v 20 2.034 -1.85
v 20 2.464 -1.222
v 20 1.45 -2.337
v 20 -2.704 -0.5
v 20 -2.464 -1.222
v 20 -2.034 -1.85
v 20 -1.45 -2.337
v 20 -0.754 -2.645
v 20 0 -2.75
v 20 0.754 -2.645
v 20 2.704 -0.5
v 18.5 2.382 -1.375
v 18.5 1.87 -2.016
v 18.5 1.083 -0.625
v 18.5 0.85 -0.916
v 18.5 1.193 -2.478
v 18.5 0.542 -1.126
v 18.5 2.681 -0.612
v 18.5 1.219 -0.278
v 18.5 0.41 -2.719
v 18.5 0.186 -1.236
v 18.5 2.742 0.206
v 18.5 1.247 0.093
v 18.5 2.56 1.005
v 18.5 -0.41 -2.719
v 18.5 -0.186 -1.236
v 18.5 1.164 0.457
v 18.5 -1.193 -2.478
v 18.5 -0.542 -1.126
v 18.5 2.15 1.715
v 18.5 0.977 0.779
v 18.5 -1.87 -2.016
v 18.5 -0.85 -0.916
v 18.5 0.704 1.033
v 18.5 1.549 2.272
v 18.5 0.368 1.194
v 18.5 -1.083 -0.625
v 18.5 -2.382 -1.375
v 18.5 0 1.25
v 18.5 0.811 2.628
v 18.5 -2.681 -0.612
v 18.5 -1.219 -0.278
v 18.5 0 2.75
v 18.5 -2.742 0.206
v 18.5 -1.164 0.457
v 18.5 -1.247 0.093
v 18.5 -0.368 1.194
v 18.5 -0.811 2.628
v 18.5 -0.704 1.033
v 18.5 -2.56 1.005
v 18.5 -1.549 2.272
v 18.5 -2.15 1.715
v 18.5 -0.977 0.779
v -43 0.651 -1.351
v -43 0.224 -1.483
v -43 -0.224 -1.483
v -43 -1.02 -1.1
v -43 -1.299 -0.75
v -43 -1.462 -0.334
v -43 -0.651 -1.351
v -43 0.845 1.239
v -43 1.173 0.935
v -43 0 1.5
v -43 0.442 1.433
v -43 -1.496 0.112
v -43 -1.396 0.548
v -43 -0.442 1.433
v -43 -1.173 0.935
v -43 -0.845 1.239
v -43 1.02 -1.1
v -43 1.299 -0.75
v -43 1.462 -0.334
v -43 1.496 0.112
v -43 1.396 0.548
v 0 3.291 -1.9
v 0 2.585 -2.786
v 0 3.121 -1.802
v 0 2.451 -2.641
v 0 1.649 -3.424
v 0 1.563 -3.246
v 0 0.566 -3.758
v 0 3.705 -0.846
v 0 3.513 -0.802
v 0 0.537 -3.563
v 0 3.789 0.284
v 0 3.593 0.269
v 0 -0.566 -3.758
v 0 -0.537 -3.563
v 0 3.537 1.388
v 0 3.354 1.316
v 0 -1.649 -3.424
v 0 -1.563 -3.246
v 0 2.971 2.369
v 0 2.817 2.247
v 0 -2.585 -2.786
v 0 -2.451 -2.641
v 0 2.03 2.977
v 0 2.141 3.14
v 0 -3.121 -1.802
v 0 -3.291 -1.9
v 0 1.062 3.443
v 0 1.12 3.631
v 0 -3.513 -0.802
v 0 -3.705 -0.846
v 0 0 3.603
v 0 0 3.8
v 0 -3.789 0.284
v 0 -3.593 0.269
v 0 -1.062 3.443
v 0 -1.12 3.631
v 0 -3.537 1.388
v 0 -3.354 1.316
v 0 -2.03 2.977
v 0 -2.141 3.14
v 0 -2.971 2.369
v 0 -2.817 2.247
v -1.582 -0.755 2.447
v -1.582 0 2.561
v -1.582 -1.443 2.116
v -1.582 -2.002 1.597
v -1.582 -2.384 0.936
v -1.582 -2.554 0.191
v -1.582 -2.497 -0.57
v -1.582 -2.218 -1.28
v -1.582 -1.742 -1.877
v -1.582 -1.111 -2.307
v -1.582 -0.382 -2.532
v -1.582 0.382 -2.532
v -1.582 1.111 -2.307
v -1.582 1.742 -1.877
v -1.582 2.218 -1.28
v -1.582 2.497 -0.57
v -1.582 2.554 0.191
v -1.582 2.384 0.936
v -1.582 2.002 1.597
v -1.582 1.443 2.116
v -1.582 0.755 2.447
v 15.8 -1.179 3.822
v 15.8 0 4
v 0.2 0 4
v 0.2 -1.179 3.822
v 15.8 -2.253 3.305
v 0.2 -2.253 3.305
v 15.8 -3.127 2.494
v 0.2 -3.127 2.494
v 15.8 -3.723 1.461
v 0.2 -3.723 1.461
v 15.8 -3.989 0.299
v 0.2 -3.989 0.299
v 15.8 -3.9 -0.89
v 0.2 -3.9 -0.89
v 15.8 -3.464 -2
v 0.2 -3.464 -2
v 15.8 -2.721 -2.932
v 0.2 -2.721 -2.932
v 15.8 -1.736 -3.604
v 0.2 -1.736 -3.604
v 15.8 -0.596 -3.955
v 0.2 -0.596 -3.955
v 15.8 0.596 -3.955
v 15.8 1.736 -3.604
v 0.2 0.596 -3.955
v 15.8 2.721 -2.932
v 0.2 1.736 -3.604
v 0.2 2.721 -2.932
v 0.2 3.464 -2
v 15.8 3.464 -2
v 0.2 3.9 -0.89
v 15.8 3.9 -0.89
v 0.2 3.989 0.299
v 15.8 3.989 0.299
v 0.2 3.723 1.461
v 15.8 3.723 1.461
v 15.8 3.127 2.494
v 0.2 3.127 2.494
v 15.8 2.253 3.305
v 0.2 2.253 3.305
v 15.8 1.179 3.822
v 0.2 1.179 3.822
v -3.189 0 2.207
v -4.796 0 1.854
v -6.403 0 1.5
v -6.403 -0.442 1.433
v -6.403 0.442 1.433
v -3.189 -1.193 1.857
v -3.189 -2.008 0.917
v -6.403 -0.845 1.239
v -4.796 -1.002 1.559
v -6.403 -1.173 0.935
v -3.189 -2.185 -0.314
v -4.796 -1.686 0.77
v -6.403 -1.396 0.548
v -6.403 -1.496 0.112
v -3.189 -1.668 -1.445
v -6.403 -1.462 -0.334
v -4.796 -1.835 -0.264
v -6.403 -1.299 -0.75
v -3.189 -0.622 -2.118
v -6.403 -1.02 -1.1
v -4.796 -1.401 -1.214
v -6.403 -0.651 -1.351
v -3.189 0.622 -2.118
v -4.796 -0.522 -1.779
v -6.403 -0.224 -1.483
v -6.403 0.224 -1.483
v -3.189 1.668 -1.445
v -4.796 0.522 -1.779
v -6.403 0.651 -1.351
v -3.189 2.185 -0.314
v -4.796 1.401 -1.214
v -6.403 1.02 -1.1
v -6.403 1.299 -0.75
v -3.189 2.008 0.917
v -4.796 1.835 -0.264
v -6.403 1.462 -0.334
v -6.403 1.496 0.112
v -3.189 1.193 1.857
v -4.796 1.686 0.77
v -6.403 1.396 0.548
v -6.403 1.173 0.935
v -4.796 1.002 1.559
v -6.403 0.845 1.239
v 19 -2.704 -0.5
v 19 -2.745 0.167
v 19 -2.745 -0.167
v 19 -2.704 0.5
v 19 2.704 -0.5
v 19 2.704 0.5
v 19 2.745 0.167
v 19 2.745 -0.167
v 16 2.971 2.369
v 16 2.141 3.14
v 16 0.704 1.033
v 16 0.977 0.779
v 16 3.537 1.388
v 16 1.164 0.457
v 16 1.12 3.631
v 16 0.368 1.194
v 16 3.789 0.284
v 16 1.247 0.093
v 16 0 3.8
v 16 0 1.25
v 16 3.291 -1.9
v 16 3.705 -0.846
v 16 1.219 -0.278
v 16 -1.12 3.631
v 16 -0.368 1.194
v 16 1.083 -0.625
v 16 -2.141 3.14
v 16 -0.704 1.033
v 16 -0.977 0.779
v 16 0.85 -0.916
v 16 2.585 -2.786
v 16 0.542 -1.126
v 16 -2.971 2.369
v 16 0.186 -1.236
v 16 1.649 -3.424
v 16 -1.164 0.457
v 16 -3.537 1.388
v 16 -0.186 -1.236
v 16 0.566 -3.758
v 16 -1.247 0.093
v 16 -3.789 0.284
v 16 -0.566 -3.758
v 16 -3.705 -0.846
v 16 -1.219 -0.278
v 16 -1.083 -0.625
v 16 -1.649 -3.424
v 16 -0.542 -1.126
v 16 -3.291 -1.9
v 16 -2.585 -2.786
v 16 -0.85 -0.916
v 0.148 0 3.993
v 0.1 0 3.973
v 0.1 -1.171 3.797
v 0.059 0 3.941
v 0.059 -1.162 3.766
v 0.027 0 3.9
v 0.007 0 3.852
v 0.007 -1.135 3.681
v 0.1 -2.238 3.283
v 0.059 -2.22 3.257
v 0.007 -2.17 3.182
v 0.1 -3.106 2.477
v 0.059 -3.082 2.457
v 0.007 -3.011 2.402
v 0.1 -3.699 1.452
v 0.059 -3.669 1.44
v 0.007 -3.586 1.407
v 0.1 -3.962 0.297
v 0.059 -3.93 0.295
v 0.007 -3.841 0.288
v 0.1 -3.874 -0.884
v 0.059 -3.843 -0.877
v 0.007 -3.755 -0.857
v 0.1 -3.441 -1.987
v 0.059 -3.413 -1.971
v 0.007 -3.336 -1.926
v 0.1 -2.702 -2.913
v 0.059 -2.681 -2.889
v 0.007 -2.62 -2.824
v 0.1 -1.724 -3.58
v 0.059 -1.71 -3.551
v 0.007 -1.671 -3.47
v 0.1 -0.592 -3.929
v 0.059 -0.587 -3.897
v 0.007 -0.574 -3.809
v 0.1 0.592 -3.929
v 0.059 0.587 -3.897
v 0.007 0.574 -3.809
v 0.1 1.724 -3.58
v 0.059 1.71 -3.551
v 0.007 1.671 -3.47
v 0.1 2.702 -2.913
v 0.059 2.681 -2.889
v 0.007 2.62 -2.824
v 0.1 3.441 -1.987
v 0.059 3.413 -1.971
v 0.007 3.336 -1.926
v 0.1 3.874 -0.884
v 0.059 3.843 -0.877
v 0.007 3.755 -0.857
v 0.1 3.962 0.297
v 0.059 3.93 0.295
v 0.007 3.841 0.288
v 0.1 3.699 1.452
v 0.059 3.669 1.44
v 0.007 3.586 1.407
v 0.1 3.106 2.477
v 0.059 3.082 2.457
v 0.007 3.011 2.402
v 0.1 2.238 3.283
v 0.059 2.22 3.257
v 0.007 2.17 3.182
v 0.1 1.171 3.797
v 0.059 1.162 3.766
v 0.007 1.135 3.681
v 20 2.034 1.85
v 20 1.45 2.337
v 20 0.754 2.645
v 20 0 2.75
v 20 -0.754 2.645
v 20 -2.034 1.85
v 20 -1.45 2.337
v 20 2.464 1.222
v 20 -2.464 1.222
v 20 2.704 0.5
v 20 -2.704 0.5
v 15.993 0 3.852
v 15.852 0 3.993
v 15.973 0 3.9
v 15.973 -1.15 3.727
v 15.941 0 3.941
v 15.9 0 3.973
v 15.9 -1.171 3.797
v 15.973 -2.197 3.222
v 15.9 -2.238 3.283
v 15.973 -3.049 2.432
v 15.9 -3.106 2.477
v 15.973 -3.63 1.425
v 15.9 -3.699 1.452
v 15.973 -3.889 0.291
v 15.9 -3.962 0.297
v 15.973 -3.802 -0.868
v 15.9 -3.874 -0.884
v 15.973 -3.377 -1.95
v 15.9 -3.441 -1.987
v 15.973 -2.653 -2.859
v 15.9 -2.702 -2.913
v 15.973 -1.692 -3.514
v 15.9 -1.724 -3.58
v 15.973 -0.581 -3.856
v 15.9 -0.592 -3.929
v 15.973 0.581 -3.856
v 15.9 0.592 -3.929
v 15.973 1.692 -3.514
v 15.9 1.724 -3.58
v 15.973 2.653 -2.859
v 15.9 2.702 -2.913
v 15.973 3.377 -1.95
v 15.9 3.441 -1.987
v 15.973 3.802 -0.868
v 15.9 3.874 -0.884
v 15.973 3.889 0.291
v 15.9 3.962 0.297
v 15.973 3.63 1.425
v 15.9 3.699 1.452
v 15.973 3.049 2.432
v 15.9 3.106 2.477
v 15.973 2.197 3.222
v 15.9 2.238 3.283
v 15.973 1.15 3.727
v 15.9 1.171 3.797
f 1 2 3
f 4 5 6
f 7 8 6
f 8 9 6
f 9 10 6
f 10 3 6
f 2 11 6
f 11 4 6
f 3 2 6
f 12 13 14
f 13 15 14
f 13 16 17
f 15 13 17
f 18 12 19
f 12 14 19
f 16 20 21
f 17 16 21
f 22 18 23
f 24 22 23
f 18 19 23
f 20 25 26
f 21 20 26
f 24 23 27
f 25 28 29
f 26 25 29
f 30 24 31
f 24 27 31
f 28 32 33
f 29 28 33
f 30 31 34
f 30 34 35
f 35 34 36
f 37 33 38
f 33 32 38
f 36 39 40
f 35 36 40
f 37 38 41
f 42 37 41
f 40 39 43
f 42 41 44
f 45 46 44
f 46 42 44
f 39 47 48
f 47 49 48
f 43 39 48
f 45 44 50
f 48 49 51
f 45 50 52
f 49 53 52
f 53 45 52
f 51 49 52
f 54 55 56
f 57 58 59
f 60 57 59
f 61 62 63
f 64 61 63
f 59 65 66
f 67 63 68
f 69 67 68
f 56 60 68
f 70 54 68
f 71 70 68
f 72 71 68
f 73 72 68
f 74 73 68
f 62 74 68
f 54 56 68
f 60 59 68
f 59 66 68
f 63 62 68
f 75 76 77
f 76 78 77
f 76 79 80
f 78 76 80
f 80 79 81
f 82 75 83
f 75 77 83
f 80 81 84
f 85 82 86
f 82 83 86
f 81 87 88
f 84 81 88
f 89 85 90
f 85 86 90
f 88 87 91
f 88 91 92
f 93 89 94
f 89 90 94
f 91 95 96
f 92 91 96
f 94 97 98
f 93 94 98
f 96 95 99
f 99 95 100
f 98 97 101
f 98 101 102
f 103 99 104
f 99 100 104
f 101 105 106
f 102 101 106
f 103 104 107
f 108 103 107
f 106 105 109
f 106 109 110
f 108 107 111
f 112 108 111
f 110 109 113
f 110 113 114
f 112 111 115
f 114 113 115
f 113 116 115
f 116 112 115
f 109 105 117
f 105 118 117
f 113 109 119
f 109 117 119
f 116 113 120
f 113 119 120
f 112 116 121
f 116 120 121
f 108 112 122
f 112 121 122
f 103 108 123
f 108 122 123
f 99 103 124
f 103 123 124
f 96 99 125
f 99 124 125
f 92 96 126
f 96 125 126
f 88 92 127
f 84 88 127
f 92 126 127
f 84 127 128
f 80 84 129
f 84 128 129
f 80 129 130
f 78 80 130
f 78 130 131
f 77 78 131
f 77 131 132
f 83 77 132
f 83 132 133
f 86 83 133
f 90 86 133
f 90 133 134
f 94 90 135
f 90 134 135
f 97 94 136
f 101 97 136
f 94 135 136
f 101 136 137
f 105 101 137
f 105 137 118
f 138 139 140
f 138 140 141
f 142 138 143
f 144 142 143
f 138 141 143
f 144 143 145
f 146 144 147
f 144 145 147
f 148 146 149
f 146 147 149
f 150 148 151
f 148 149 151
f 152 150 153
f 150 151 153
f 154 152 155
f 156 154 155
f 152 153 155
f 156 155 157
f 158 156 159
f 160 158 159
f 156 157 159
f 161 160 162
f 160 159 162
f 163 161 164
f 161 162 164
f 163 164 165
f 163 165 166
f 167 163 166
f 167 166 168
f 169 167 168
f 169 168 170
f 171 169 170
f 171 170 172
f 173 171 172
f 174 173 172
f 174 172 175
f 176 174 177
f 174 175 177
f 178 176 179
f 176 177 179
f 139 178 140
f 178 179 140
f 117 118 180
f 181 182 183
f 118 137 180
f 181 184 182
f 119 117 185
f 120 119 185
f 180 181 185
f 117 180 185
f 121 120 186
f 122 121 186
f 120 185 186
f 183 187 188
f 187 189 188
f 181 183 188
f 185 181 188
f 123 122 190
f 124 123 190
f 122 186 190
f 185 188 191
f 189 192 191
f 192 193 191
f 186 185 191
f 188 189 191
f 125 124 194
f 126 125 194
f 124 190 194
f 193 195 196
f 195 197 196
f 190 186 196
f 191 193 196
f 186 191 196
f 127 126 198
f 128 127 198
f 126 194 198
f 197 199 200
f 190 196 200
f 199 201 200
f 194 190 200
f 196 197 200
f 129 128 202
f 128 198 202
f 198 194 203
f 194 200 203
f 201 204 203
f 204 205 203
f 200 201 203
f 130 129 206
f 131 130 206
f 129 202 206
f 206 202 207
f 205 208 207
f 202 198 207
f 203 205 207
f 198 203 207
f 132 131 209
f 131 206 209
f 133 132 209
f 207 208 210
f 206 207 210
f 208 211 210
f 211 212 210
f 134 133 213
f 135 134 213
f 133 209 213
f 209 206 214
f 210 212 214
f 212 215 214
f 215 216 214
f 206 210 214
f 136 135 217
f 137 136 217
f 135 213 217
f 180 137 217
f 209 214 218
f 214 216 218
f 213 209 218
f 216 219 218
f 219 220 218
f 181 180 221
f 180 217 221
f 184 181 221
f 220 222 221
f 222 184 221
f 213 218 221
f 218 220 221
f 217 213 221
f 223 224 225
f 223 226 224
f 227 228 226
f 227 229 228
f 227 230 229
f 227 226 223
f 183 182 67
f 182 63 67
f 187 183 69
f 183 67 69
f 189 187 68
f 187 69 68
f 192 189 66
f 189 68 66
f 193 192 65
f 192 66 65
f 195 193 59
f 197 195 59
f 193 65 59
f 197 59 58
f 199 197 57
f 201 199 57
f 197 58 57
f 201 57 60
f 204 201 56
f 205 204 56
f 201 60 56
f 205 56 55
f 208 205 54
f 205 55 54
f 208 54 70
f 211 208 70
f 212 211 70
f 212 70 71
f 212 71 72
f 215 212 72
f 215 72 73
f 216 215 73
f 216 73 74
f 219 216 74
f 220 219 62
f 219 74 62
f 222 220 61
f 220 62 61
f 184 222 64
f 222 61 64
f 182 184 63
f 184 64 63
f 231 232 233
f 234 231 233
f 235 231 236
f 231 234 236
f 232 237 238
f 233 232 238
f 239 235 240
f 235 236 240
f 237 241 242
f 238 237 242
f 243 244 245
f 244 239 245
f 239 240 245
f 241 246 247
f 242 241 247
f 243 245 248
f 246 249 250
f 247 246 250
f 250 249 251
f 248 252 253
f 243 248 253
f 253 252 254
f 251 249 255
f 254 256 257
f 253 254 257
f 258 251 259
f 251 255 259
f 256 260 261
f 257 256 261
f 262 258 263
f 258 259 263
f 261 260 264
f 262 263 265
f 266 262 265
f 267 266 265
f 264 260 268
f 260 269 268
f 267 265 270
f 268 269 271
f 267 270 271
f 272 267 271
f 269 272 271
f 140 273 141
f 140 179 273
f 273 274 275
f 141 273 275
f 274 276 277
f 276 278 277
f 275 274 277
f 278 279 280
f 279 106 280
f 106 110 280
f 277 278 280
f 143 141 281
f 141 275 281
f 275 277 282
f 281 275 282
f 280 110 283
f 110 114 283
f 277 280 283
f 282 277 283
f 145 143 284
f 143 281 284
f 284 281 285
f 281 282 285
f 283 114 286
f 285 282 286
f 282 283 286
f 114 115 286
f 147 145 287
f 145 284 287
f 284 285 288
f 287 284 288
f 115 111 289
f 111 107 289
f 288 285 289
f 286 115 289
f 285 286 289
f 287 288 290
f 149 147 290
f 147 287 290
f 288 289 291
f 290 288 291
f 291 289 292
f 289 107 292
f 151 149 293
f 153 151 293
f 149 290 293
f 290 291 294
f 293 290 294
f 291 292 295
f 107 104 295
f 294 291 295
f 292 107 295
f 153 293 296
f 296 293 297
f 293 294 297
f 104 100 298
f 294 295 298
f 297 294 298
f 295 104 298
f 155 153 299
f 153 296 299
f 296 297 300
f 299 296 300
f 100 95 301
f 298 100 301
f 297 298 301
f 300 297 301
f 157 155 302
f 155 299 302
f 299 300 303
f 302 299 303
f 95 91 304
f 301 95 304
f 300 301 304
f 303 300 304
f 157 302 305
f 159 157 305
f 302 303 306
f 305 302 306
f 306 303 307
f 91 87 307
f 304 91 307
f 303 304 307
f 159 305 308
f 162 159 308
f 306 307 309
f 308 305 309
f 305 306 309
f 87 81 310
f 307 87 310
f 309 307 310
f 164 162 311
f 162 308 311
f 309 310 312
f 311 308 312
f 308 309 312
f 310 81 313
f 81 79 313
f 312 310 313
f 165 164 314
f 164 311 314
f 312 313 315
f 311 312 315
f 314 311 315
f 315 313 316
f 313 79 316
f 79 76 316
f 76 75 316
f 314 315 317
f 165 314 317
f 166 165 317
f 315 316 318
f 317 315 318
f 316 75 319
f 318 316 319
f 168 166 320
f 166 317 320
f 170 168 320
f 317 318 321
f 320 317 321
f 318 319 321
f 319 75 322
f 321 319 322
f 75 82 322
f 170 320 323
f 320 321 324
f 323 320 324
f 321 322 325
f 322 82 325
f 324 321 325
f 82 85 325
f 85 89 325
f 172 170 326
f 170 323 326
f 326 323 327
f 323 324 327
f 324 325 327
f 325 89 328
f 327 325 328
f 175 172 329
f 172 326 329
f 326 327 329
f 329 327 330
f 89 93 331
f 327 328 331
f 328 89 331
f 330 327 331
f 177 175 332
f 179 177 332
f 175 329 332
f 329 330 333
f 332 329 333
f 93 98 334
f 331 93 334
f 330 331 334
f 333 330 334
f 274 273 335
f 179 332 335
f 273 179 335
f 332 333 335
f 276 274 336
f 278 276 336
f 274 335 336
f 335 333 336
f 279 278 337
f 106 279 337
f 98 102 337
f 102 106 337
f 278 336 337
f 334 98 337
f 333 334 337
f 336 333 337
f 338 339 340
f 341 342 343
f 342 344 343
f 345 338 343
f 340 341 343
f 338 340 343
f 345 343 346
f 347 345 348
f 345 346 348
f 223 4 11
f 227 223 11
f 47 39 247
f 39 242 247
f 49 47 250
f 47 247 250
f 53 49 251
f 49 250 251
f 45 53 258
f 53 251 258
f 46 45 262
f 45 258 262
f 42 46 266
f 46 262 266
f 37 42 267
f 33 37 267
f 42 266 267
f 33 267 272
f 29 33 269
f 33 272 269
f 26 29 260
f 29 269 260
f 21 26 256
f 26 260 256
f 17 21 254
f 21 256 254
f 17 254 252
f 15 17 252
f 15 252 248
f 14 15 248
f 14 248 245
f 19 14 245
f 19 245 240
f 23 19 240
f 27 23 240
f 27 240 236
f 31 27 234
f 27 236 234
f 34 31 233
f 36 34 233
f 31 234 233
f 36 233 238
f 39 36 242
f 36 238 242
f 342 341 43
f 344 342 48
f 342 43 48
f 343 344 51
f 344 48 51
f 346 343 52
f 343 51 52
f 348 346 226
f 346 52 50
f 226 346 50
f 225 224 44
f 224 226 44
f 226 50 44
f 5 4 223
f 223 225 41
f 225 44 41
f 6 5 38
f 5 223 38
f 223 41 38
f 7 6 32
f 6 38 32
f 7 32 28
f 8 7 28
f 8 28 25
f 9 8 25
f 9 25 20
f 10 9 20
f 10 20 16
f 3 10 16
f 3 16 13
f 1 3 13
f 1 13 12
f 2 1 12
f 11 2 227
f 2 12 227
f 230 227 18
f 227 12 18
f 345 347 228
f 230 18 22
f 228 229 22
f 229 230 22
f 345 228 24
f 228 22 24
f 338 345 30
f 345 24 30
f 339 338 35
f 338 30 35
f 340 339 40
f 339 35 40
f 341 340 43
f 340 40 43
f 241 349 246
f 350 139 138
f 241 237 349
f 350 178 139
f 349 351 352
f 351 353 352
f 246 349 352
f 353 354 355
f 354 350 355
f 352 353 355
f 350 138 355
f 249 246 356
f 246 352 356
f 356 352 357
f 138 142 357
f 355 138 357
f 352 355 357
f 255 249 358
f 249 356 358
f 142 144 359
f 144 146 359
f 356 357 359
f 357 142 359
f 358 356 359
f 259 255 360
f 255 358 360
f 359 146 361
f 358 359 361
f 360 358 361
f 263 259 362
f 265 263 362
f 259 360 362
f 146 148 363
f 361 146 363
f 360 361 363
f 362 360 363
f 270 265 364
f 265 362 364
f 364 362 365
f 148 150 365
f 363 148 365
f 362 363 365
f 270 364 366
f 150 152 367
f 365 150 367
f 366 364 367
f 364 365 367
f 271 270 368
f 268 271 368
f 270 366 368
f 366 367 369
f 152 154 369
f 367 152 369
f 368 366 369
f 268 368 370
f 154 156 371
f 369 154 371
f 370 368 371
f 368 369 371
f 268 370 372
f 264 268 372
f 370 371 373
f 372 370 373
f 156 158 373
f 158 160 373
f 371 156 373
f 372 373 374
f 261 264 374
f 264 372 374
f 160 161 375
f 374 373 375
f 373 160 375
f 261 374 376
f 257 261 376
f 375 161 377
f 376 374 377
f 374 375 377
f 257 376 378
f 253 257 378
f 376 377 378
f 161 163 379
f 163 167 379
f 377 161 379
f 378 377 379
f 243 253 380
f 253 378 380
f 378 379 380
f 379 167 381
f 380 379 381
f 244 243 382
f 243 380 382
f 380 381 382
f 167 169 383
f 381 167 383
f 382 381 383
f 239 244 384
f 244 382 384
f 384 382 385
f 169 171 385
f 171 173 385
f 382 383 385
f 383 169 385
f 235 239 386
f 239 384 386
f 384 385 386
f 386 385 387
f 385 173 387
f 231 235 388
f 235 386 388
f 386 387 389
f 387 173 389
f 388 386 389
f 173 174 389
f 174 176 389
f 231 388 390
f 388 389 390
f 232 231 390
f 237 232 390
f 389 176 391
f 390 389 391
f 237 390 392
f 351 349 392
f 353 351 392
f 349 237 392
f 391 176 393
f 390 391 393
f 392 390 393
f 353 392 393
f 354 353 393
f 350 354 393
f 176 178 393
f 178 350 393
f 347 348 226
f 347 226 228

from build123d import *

# Parameters (mm, degrees)
FILLET1_R          = 0.2
SKETCH2_W          = 1
SKETCH2_H          = 6.101946446
CUT_EXTRUDE1_DEPTH = 1


with BuildPart() as part:
    # Sketch1 → Revolve1 (revolve)
    with BuildSketch(Plane.XY, mode=Mode.PRIVATE) as revolve1_sk:
        Polygon((-6.402554748, 1.5), (-43, 1.5), (-43, 0), (16, 0), (20, 0), (20, 2.75), (18.5, 2.75), (18.5, 1.25), (16, 1.25), (16, 4), (0, 4), (0, 3.603313767), (-1.581765583, 2.560980975), align=None)
    revolve(revolve1_sk.sketch.rotate(Axis((-43, 0, 0), (1, 0, 0)), 90), axis=Axis((-43, 0, 0), (1, 0, 0)))

    # Fillet1
    fillet1_edges = [part.edges().sort_by_distance(p)[0] for p in [
        (0, 0, -4),
        (16, 0, -4),
    ]]
    fillet(fillet1_edges, radius=FILLET1_R)

    # Sketch2 → Cut-Extrude1 (cut)
    with BuildSketch(Plane(origin=(20, 0, 0), x_dir=(0, 0, -1), z_dir=(1, 0, 0))):
        with Locations((0, 0.058366444)):
            Rectangle(SKETCH2_W, SKETCH2_H)
    extrude(amount=-CUT_EXTRUDE1_DEPTH, mode=Mode.SUBTRACT)


solid = part.part
